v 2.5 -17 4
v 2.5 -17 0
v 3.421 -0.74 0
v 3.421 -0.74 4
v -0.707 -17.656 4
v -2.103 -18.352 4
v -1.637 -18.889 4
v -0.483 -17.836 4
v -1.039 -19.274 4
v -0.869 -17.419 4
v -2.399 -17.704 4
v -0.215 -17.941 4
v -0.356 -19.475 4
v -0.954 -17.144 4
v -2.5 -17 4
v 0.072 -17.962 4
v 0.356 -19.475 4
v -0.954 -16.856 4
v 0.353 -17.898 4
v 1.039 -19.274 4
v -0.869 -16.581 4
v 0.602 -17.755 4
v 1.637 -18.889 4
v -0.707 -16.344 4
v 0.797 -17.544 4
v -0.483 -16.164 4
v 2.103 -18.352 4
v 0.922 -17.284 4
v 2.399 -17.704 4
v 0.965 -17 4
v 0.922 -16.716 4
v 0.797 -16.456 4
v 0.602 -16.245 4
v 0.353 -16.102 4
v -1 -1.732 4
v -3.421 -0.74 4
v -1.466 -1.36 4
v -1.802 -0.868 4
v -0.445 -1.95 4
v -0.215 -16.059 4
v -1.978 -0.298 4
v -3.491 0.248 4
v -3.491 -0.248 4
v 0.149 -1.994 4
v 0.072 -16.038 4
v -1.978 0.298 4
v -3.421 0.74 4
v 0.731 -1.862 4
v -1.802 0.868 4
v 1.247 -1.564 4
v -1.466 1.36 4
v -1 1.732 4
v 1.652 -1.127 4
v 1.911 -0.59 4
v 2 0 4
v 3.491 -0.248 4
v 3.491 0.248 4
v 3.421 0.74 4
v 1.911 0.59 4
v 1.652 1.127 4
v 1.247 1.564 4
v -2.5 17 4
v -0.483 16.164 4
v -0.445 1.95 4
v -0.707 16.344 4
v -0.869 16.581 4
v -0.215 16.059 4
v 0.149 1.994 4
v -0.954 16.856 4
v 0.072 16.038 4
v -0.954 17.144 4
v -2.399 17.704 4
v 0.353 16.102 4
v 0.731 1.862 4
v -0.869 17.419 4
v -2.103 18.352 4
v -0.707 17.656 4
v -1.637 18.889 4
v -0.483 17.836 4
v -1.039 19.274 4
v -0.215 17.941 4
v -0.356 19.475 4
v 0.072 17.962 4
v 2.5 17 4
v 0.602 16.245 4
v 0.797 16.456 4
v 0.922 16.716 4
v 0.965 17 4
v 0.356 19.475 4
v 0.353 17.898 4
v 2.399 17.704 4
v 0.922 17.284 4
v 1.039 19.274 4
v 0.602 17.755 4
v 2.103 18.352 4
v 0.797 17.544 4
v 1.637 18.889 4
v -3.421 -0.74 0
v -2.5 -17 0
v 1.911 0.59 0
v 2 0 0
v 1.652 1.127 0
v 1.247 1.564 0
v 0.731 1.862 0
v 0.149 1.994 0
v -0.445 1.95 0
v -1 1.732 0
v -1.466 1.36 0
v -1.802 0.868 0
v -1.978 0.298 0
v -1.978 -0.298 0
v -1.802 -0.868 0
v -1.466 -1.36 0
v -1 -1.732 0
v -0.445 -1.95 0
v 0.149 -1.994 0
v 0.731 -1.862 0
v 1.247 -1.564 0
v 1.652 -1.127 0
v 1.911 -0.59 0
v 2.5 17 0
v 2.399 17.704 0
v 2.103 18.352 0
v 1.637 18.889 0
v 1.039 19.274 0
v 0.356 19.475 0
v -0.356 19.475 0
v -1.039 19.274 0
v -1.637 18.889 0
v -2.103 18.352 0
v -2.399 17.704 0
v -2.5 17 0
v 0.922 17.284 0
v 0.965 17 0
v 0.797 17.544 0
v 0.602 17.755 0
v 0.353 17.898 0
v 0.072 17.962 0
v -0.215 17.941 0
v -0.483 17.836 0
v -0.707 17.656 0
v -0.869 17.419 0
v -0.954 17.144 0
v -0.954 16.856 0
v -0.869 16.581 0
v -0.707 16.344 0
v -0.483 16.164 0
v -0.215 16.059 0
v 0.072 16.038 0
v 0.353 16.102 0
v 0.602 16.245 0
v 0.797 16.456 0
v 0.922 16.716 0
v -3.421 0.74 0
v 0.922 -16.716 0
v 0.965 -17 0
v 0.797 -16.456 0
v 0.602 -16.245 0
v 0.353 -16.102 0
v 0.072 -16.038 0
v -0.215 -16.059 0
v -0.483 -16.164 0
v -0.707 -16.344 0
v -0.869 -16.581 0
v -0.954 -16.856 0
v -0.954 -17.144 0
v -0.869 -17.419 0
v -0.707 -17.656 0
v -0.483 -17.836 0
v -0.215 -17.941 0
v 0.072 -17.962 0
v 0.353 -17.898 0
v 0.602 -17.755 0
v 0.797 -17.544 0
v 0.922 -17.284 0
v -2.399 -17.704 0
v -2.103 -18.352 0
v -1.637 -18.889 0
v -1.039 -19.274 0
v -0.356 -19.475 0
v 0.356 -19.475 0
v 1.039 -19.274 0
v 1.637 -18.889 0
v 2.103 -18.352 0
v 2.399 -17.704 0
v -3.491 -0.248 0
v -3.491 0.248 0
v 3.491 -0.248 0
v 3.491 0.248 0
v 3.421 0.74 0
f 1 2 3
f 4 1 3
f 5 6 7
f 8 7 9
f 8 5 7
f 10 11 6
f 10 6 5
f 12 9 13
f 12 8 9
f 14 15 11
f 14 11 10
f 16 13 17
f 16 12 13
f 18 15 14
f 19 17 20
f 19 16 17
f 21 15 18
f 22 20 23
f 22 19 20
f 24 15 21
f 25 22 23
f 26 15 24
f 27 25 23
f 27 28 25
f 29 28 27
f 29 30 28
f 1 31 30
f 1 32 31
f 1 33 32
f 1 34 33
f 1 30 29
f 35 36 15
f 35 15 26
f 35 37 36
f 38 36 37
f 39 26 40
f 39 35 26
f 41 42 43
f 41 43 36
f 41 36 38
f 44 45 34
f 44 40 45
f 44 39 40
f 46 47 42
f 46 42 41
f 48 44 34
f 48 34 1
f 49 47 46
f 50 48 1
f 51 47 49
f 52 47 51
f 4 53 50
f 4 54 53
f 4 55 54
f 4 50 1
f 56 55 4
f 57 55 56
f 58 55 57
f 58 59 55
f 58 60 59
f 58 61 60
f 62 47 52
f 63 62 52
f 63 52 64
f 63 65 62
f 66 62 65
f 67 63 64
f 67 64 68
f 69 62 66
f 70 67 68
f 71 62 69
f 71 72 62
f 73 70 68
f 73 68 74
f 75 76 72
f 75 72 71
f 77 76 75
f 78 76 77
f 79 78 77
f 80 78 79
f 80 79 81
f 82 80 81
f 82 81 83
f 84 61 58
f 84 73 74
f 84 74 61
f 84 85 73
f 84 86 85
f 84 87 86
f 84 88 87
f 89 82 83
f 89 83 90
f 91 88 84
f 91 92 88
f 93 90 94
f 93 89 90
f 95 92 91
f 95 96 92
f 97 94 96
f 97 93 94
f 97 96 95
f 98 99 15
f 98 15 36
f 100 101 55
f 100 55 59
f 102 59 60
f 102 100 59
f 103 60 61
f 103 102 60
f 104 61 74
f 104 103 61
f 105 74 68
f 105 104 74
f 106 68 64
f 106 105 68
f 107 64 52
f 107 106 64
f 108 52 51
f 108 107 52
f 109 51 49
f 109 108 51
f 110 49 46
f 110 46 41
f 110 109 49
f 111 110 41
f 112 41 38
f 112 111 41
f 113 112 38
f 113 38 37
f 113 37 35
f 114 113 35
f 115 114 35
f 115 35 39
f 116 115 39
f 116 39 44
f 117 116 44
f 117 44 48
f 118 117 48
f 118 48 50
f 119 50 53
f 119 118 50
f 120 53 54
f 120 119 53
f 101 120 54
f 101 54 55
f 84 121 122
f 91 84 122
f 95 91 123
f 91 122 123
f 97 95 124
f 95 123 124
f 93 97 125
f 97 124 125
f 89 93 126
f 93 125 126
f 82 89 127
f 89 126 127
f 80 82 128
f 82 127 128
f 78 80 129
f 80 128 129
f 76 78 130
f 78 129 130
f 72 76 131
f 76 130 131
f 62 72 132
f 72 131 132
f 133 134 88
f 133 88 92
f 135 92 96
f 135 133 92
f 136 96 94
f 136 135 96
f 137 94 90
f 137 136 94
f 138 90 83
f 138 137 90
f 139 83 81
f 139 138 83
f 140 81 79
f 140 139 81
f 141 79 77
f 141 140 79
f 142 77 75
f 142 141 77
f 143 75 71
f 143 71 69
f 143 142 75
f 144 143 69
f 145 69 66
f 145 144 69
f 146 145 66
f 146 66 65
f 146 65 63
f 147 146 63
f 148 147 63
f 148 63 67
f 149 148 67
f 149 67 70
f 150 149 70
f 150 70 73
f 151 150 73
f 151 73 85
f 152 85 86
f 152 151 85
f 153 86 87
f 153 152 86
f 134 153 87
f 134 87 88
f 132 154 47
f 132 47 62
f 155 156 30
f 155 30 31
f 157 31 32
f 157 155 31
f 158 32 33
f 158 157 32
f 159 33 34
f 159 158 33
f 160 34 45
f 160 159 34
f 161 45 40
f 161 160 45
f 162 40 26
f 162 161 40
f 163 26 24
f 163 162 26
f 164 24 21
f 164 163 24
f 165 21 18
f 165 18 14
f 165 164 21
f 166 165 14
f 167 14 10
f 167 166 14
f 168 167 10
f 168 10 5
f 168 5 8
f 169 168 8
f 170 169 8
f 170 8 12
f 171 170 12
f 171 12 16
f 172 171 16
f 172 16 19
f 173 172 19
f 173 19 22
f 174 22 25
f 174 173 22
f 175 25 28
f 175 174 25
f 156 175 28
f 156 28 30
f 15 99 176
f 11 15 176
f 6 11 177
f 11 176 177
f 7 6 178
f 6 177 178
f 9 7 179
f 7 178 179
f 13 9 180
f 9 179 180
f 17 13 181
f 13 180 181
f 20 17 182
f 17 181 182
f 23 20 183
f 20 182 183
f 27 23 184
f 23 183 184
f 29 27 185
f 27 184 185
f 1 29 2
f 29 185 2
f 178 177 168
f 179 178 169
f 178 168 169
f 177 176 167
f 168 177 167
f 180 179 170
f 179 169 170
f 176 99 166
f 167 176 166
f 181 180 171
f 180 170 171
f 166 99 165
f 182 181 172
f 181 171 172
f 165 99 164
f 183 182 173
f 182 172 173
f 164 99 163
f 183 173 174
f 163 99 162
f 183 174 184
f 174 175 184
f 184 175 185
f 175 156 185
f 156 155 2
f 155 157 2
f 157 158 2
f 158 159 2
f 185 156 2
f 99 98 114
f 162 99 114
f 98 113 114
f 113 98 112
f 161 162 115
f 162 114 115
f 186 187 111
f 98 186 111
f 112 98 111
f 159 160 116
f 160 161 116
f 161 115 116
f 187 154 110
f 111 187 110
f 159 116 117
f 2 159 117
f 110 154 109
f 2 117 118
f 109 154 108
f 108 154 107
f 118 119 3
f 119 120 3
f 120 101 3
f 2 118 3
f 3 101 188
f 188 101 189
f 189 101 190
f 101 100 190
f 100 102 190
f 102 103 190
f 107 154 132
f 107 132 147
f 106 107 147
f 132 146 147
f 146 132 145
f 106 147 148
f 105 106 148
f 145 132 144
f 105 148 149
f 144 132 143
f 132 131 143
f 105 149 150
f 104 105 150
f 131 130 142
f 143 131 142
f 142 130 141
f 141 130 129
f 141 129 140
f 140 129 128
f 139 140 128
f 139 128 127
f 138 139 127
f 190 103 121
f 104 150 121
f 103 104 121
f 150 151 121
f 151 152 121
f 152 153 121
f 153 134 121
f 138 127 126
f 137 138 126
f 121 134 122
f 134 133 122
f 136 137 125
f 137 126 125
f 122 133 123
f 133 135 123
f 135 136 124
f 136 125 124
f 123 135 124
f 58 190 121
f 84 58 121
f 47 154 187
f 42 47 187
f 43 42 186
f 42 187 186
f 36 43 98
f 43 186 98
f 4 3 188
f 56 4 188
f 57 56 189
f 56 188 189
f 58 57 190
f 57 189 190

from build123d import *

# Parameters (mm, degrees)
SKETCH001_R   = 2
SKETCH001_R_2 = 0.965047
PAD_DEPTH     = 4


with BuildPart() as part:
    # Sketch001 → Pad (new body)
    with BuildSketch(Plane.XY):
        with BuildLine():
            ThreePointArc((-3.420895, 0.739919), (-3.5, 0), (-3.420895, -0.739919))
            Line((-2.5, -17), (-3.420895, -0.739919))
            ThreePointArc((-2.5, -17), (0, -19.5), (2.5, -17))
            Line((2.5, -17), (3.420895, -0.739919))
            ThreePointArc((3.420895, -0.739919), (3.5, 0), (3.420895, 0.739919))
            Line((3.420895, 0.739919), (2.5, 17))
            ThreePointArc((2.5, 17), (0, 19.5), (-2.5, 17))
            Line((-3.420895, 0.739919), (-2.5, 17))
        make_face()
        Circle(SKETCH001_R, mode=Mode.SUBTRACT)
        with Locations((0, 17)):
            Circle(SKETCH001_R_2, mode=Mode.SUBTRACT)
        with Locations((0, -17)):
            Circle(SKETCH001_R_2, mode=Mode.SUBTRACT)
    extrude(amount=PAD_DEPTH)


solid = part.part
